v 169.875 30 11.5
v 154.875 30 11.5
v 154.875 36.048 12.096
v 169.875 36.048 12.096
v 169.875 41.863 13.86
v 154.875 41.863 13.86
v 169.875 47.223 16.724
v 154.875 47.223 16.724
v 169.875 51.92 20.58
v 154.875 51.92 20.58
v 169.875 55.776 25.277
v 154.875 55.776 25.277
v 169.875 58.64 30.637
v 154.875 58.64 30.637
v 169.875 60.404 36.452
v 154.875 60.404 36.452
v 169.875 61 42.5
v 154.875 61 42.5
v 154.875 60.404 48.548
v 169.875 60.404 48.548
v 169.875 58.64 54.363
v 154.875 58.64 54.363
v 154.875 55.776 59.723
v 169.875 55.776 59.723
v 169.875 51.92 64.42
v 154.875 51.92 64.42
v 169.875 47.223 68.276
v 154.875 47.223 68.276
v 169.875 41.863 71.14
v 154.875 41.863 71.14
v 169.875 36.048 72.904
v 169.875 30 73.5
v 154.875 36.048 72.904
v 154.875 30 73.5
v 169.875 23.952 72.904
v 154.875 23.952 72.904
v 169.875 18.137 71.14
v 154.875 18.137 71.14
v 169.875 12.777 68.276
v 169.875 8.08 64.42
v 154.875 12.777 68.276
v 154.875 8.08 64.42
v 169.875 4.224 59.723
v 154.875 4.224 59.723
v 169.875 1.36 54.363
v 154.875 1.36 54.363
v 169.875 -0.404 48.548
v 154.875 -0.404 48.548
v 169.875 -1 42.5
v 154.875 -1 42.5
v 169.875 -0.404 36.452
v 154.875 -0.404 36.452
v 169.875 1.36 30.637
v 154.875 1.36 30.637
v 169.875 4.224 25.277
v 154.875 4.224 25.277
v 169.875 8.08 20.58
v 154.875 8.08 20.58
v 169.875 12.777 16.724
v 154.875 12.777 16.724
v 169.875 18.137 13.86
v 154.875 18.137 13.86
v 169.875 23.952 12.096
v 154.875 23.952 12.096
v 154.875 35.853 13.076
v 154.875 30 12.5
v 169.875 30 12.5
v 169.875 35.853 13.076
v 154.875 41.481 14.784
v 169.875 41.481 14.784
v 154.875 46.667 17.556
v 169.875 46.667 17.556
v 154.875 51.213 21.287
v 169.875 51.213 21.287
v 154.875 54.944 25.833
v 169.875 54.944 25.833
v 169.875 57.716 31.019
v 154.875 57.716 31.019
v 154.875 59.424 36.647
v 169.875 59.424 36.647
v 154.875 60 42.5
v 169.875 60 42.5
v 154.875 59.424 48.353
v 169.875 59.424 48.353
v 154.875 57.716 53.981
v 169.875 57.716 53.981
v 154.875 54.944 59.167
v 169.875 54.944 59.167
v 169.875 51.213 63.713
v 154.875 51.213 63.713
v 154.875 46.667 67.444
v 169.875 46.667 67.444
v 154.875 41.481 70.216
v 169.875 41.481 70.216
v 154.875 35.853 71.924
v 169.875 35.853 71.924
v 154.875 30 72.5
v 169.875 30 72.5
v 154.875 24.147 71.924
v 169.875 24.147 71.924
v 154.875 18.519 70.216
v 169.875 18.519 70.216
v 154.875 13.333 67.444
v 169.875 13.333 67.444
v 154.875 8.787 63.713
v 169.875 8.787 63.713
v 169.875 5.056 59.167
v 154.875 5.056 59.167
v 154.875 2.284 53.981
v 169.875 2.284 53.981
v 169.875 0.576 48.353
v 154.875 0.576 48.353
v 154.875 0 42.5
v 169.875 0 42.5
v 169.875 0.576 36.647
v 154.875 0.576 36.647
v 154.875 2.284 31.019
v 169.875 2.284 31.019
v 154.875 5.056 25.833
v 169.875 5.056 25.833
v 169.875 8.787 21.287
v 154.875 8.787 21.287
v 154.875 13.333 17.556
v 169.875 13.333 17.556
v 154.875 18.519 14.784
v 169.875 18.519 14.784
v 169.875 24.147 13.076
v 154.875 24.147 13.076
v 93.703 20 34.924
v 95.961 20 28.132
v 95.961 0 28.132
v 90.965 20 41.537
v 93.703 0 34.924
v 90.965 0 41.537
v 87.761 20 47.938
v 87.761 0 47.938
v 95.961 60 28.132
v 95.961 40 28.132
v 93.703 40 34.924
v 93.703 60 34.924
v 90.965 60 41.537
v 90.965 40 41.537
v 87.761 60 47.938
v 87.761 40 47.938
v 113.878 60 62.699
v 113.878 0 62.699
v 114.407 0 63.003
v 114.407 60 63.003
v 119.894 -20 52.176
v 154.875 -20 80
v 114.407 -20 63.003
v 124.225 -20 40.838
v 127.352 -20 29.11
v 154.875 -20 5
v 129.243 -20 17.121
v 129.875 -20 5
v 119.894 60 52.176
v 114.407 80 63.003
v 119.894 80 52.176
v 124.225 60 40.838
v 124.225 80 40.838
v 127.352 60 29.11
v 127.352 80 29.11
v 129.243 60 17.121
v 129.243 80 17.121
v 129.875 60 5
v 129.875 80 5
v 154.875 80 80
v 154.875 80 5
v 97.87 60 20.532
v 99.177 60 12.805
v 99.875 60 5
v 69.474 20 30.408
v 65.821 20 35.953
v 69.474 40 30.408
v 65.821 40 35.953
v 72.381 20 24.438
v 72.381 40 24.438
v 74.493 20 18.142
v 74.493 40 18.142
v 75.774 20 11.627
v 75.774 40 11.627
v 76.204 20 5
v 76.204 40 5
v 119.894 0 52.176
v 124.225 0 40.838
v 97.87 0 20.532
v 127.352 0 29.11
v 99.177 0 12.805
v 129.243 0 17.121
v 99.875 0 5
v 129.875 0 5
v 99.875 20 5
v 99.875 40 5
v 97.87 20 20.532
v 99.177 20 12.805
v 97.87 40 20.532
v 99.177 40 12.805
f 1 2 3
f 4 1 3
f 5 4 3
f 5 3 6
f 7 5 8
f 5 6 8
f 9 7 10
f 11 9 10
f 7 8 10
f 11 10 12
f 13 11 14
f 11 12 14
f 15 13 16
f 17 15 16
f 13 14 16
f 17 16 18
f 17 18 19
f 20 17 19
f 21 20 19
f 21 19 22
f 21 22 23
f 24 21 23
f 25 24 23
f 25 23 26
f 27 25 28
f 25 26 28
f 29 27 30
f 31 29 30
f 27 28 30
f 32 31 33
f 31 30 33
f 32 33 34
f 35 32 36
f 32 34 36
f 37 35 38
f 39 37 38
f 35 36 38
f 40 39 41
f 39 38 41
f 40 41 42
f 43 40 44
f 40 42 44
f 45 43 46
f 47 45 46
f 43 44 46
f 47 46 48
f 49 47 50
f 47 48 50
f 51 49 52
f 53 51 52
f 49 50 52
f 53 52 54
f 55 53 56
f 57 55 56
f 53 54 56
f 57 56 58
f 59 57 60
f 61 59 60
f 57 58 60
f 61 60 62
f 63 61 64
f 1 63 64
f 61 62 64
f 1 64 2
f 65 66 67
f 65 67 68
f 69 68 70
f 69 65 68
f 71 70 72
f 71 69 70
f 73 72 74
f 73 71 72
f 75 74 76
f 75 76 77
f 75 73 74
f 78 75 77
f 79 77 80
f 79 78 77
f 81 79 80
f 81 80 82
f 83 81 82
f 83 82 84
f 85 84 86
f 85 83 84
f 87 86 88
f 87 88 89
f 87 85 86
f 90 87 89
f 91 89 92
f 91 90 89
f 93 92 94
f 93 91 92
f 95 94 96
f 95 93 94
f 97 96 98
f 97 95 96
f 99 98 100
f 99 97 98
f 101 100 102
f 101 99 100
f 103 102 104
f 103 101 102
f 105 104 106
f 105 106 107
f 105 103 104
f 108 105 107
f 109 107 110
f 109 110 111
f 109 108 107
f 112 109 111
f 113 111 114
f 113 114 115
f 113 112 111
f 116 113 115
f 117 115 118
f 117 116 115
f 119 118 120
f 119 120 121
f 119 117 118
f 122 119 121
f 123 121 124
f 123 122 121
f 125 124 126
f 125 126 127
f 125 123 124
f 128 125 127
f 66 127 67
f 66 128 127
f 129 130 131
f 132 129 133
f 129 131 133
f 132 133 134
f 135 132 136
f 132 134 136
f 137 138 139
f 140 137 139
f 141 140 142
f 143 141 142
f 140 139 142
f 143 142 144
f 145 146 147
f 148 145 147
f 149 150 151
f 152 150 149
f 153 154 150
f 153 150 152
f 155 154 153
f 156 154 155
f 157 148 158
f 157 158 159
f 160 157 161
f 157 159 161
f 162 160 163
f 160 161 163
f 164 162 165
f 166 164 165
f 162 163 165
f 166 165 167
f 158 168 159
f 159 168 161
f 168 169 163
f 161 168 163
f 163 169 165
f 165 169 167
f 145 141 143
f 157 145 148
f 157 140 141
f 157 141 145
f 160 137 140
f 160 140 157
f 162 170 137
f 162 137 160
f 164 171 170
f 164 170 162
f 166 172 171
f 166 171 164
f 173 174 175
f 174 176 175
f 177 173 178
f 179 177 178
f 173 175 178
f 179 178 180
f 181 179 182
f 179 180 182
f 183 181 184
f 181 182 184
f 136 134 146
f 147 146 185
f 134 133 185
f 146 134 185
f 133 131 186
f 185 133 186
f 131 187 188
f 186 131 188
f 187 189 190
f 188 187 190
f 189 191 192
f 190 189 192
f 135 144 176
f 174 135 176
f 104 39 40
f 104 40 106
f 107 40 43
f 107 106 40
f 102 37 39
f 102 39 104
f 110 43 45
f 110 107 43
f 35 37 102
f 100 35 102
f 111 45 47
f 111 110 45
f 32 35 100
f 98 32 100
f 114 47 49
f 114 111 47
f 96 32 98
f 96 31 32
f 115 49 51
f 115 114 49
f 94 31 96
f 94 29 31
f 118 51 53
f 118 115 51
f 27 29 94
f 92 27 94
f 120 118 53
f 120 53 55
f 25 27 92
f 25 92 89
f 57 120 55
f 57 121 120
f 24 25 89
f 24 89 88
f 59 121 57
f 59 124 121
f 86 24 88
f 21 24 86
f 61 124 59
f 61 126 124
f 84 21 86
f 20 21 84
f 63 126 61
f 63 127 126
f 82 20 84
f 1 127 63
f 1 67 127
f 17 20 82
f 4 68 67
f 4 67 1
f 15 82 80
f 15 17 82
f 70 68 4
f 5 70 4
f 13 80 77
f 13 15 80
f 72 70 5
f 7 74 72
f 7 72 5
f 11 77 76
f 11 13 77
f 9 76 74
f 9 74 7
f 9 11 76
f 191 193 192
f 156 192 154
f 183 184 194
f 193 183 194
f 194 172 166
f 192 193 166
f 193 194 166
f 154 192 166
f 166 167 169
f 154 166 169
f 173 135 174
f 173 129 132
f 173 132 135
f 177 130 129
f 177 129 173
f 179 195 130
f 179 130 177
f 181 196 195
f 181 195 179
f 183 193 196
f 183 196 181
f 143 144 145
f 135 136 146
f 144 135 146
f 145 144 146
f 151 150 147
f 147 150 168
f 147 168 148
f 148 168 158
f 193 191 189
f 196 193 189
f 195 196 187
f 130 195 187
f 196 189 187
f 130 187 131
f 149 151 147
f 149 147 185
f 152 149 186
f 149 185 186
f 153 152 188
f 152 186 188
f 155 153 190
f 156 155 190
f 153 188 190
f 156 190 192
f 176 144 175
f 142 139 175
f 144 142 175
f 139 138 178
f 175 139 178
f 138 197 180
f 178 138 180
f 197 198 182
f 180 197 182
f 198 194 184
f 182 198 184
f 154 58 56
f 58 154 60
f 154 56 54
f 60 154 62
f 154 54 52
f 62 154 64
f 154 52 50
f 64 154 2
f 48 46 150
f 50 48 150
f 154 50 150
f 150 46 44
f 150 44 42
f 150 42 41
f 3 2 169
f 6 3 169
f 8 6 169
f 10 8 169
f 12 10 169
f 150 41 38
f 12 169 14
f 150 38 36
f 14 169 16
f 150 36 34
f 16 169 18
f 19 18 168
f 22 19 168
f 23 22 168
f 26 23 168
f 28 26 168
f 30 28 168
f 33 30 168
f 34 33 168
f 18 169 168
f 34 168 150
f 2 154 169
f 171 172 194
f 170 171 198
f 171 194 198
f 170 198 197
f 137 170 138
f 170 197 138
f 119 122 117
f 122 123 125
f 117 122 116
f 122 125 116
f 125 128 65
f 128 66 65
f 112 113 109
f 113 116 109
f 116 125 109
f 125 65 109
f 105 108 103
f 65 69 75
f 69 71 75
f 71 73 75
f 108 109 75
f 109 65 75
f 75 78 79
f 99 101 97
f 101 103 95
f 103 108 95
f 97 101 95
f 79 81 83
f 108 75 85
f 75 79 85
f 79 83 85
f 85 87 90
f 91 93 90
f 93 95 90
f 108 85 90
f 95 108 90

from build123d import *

# Parameters (mm, degrees)
BOSS_EXTRUDE1_DEPTH = 60
BOSS_EXTRUDE2_DEPTH = 10
BOSS_EXTRUDE3_DEPTH = 50
SKETCH6_R           = 31
SKETCH6_R_2         = 30
BOSS_EXTRUDE4_DEPTH = 15


with BuildPart() as part:
    # Sketch3 → Boss-Extrude1 (new body)
    with BuildSketch(Plane(origin=(0, 0, 0), x_dir=(1, 0, 0), z_dir=(0, 1, 0))):
        with BuildLine():
            Line((87.760961666, -47.937601186), (113.87798128, -62.699081006))
            Line((113.87798128, -62.699081006), (114.406801927, -63.002726521))
            ThreePointArc((114.406801927, -63.002726521), (125.941479433, -35.014908861), (129.874921777, -5))
            Line((129.874921777, -5), (99.874921777, -5))
            ThreePointArc((99.874921777, -5), (98.598858001, -16.681282954), (95.96133419, -28.132229568))
            ThreePointArc((95.96133419, -28.132229568), (92.393363857, -38.255278265), (87.760961666, -47.937601186))
        make_face()
    extrude(amount=BOSS_EXTRUDE1_DEPTH)

    # Sketch4 → Boss-Extrude2 (add, symmetric)
    with BuildSketch(Plane(origin=(0, 30, 0), x_dir=(1, 0, 0), z_dir=(0, 1, 0))):
        with BuildLine():
            Line((87.760961666, -47.937601186), (65.820721249, -35.95320089))
            ThreePointArc((65.820721249, -35.95320089), (73.538888161, -21.324139043), (76.203852603, -5))
            Line((76.203852603, -5), (99.874921777, -5))
            ThreePointArc((99.874921777, -5), (96.243002799, -27.152981645), (87.760961666, -47.937601186))
        make_face()
    extrude(amount=BOSS_EXTRUDE2_DEPTH, both=True)

    # Sketch5 → Boss-Extrude3 (add, symmetric)
    with BuildSketch(Plane(origin=(0, 30, 0), x_dir=(1, 0, 0), z_dir=(0, 1, 0))):
        with BuildLine():
            Line((129.874921777, -5), (154.874921777, -5))
            Line((154.874921777, -5), (154.874921777, -63.002726521))
            Line((154.874921777, -63.002726521), (154.874921777, -80))
            Line((154.874921777, -80), (114.406801927, -63.002726521))
            ThreePointArc((114.406801927, -63.002726521), (125.941479433, -35.014908861), (129.874921777, -5))
        make_face()
    extrude(amount=BOSS_EXTRUDE3_DEPTH, both=True)

    # Sketch6 → Boss-Extrude4 (add)
    with BuildSketch(Plane(origin=(154.874921777, 0, 0), x_dir=(0, 0, -1), z_dir=(1, 0, 0))):
        with Locations((-42.5, 30)):
            Circle(SKETCH6_R)
        with Locations((-42.5, 30)):
            Circle(SKETCH6_R_2, mode=Mode.SUBTRACT)
    extrude(amount=BOSS_EXTRUDE4_DEPTH)


solid = part.part
